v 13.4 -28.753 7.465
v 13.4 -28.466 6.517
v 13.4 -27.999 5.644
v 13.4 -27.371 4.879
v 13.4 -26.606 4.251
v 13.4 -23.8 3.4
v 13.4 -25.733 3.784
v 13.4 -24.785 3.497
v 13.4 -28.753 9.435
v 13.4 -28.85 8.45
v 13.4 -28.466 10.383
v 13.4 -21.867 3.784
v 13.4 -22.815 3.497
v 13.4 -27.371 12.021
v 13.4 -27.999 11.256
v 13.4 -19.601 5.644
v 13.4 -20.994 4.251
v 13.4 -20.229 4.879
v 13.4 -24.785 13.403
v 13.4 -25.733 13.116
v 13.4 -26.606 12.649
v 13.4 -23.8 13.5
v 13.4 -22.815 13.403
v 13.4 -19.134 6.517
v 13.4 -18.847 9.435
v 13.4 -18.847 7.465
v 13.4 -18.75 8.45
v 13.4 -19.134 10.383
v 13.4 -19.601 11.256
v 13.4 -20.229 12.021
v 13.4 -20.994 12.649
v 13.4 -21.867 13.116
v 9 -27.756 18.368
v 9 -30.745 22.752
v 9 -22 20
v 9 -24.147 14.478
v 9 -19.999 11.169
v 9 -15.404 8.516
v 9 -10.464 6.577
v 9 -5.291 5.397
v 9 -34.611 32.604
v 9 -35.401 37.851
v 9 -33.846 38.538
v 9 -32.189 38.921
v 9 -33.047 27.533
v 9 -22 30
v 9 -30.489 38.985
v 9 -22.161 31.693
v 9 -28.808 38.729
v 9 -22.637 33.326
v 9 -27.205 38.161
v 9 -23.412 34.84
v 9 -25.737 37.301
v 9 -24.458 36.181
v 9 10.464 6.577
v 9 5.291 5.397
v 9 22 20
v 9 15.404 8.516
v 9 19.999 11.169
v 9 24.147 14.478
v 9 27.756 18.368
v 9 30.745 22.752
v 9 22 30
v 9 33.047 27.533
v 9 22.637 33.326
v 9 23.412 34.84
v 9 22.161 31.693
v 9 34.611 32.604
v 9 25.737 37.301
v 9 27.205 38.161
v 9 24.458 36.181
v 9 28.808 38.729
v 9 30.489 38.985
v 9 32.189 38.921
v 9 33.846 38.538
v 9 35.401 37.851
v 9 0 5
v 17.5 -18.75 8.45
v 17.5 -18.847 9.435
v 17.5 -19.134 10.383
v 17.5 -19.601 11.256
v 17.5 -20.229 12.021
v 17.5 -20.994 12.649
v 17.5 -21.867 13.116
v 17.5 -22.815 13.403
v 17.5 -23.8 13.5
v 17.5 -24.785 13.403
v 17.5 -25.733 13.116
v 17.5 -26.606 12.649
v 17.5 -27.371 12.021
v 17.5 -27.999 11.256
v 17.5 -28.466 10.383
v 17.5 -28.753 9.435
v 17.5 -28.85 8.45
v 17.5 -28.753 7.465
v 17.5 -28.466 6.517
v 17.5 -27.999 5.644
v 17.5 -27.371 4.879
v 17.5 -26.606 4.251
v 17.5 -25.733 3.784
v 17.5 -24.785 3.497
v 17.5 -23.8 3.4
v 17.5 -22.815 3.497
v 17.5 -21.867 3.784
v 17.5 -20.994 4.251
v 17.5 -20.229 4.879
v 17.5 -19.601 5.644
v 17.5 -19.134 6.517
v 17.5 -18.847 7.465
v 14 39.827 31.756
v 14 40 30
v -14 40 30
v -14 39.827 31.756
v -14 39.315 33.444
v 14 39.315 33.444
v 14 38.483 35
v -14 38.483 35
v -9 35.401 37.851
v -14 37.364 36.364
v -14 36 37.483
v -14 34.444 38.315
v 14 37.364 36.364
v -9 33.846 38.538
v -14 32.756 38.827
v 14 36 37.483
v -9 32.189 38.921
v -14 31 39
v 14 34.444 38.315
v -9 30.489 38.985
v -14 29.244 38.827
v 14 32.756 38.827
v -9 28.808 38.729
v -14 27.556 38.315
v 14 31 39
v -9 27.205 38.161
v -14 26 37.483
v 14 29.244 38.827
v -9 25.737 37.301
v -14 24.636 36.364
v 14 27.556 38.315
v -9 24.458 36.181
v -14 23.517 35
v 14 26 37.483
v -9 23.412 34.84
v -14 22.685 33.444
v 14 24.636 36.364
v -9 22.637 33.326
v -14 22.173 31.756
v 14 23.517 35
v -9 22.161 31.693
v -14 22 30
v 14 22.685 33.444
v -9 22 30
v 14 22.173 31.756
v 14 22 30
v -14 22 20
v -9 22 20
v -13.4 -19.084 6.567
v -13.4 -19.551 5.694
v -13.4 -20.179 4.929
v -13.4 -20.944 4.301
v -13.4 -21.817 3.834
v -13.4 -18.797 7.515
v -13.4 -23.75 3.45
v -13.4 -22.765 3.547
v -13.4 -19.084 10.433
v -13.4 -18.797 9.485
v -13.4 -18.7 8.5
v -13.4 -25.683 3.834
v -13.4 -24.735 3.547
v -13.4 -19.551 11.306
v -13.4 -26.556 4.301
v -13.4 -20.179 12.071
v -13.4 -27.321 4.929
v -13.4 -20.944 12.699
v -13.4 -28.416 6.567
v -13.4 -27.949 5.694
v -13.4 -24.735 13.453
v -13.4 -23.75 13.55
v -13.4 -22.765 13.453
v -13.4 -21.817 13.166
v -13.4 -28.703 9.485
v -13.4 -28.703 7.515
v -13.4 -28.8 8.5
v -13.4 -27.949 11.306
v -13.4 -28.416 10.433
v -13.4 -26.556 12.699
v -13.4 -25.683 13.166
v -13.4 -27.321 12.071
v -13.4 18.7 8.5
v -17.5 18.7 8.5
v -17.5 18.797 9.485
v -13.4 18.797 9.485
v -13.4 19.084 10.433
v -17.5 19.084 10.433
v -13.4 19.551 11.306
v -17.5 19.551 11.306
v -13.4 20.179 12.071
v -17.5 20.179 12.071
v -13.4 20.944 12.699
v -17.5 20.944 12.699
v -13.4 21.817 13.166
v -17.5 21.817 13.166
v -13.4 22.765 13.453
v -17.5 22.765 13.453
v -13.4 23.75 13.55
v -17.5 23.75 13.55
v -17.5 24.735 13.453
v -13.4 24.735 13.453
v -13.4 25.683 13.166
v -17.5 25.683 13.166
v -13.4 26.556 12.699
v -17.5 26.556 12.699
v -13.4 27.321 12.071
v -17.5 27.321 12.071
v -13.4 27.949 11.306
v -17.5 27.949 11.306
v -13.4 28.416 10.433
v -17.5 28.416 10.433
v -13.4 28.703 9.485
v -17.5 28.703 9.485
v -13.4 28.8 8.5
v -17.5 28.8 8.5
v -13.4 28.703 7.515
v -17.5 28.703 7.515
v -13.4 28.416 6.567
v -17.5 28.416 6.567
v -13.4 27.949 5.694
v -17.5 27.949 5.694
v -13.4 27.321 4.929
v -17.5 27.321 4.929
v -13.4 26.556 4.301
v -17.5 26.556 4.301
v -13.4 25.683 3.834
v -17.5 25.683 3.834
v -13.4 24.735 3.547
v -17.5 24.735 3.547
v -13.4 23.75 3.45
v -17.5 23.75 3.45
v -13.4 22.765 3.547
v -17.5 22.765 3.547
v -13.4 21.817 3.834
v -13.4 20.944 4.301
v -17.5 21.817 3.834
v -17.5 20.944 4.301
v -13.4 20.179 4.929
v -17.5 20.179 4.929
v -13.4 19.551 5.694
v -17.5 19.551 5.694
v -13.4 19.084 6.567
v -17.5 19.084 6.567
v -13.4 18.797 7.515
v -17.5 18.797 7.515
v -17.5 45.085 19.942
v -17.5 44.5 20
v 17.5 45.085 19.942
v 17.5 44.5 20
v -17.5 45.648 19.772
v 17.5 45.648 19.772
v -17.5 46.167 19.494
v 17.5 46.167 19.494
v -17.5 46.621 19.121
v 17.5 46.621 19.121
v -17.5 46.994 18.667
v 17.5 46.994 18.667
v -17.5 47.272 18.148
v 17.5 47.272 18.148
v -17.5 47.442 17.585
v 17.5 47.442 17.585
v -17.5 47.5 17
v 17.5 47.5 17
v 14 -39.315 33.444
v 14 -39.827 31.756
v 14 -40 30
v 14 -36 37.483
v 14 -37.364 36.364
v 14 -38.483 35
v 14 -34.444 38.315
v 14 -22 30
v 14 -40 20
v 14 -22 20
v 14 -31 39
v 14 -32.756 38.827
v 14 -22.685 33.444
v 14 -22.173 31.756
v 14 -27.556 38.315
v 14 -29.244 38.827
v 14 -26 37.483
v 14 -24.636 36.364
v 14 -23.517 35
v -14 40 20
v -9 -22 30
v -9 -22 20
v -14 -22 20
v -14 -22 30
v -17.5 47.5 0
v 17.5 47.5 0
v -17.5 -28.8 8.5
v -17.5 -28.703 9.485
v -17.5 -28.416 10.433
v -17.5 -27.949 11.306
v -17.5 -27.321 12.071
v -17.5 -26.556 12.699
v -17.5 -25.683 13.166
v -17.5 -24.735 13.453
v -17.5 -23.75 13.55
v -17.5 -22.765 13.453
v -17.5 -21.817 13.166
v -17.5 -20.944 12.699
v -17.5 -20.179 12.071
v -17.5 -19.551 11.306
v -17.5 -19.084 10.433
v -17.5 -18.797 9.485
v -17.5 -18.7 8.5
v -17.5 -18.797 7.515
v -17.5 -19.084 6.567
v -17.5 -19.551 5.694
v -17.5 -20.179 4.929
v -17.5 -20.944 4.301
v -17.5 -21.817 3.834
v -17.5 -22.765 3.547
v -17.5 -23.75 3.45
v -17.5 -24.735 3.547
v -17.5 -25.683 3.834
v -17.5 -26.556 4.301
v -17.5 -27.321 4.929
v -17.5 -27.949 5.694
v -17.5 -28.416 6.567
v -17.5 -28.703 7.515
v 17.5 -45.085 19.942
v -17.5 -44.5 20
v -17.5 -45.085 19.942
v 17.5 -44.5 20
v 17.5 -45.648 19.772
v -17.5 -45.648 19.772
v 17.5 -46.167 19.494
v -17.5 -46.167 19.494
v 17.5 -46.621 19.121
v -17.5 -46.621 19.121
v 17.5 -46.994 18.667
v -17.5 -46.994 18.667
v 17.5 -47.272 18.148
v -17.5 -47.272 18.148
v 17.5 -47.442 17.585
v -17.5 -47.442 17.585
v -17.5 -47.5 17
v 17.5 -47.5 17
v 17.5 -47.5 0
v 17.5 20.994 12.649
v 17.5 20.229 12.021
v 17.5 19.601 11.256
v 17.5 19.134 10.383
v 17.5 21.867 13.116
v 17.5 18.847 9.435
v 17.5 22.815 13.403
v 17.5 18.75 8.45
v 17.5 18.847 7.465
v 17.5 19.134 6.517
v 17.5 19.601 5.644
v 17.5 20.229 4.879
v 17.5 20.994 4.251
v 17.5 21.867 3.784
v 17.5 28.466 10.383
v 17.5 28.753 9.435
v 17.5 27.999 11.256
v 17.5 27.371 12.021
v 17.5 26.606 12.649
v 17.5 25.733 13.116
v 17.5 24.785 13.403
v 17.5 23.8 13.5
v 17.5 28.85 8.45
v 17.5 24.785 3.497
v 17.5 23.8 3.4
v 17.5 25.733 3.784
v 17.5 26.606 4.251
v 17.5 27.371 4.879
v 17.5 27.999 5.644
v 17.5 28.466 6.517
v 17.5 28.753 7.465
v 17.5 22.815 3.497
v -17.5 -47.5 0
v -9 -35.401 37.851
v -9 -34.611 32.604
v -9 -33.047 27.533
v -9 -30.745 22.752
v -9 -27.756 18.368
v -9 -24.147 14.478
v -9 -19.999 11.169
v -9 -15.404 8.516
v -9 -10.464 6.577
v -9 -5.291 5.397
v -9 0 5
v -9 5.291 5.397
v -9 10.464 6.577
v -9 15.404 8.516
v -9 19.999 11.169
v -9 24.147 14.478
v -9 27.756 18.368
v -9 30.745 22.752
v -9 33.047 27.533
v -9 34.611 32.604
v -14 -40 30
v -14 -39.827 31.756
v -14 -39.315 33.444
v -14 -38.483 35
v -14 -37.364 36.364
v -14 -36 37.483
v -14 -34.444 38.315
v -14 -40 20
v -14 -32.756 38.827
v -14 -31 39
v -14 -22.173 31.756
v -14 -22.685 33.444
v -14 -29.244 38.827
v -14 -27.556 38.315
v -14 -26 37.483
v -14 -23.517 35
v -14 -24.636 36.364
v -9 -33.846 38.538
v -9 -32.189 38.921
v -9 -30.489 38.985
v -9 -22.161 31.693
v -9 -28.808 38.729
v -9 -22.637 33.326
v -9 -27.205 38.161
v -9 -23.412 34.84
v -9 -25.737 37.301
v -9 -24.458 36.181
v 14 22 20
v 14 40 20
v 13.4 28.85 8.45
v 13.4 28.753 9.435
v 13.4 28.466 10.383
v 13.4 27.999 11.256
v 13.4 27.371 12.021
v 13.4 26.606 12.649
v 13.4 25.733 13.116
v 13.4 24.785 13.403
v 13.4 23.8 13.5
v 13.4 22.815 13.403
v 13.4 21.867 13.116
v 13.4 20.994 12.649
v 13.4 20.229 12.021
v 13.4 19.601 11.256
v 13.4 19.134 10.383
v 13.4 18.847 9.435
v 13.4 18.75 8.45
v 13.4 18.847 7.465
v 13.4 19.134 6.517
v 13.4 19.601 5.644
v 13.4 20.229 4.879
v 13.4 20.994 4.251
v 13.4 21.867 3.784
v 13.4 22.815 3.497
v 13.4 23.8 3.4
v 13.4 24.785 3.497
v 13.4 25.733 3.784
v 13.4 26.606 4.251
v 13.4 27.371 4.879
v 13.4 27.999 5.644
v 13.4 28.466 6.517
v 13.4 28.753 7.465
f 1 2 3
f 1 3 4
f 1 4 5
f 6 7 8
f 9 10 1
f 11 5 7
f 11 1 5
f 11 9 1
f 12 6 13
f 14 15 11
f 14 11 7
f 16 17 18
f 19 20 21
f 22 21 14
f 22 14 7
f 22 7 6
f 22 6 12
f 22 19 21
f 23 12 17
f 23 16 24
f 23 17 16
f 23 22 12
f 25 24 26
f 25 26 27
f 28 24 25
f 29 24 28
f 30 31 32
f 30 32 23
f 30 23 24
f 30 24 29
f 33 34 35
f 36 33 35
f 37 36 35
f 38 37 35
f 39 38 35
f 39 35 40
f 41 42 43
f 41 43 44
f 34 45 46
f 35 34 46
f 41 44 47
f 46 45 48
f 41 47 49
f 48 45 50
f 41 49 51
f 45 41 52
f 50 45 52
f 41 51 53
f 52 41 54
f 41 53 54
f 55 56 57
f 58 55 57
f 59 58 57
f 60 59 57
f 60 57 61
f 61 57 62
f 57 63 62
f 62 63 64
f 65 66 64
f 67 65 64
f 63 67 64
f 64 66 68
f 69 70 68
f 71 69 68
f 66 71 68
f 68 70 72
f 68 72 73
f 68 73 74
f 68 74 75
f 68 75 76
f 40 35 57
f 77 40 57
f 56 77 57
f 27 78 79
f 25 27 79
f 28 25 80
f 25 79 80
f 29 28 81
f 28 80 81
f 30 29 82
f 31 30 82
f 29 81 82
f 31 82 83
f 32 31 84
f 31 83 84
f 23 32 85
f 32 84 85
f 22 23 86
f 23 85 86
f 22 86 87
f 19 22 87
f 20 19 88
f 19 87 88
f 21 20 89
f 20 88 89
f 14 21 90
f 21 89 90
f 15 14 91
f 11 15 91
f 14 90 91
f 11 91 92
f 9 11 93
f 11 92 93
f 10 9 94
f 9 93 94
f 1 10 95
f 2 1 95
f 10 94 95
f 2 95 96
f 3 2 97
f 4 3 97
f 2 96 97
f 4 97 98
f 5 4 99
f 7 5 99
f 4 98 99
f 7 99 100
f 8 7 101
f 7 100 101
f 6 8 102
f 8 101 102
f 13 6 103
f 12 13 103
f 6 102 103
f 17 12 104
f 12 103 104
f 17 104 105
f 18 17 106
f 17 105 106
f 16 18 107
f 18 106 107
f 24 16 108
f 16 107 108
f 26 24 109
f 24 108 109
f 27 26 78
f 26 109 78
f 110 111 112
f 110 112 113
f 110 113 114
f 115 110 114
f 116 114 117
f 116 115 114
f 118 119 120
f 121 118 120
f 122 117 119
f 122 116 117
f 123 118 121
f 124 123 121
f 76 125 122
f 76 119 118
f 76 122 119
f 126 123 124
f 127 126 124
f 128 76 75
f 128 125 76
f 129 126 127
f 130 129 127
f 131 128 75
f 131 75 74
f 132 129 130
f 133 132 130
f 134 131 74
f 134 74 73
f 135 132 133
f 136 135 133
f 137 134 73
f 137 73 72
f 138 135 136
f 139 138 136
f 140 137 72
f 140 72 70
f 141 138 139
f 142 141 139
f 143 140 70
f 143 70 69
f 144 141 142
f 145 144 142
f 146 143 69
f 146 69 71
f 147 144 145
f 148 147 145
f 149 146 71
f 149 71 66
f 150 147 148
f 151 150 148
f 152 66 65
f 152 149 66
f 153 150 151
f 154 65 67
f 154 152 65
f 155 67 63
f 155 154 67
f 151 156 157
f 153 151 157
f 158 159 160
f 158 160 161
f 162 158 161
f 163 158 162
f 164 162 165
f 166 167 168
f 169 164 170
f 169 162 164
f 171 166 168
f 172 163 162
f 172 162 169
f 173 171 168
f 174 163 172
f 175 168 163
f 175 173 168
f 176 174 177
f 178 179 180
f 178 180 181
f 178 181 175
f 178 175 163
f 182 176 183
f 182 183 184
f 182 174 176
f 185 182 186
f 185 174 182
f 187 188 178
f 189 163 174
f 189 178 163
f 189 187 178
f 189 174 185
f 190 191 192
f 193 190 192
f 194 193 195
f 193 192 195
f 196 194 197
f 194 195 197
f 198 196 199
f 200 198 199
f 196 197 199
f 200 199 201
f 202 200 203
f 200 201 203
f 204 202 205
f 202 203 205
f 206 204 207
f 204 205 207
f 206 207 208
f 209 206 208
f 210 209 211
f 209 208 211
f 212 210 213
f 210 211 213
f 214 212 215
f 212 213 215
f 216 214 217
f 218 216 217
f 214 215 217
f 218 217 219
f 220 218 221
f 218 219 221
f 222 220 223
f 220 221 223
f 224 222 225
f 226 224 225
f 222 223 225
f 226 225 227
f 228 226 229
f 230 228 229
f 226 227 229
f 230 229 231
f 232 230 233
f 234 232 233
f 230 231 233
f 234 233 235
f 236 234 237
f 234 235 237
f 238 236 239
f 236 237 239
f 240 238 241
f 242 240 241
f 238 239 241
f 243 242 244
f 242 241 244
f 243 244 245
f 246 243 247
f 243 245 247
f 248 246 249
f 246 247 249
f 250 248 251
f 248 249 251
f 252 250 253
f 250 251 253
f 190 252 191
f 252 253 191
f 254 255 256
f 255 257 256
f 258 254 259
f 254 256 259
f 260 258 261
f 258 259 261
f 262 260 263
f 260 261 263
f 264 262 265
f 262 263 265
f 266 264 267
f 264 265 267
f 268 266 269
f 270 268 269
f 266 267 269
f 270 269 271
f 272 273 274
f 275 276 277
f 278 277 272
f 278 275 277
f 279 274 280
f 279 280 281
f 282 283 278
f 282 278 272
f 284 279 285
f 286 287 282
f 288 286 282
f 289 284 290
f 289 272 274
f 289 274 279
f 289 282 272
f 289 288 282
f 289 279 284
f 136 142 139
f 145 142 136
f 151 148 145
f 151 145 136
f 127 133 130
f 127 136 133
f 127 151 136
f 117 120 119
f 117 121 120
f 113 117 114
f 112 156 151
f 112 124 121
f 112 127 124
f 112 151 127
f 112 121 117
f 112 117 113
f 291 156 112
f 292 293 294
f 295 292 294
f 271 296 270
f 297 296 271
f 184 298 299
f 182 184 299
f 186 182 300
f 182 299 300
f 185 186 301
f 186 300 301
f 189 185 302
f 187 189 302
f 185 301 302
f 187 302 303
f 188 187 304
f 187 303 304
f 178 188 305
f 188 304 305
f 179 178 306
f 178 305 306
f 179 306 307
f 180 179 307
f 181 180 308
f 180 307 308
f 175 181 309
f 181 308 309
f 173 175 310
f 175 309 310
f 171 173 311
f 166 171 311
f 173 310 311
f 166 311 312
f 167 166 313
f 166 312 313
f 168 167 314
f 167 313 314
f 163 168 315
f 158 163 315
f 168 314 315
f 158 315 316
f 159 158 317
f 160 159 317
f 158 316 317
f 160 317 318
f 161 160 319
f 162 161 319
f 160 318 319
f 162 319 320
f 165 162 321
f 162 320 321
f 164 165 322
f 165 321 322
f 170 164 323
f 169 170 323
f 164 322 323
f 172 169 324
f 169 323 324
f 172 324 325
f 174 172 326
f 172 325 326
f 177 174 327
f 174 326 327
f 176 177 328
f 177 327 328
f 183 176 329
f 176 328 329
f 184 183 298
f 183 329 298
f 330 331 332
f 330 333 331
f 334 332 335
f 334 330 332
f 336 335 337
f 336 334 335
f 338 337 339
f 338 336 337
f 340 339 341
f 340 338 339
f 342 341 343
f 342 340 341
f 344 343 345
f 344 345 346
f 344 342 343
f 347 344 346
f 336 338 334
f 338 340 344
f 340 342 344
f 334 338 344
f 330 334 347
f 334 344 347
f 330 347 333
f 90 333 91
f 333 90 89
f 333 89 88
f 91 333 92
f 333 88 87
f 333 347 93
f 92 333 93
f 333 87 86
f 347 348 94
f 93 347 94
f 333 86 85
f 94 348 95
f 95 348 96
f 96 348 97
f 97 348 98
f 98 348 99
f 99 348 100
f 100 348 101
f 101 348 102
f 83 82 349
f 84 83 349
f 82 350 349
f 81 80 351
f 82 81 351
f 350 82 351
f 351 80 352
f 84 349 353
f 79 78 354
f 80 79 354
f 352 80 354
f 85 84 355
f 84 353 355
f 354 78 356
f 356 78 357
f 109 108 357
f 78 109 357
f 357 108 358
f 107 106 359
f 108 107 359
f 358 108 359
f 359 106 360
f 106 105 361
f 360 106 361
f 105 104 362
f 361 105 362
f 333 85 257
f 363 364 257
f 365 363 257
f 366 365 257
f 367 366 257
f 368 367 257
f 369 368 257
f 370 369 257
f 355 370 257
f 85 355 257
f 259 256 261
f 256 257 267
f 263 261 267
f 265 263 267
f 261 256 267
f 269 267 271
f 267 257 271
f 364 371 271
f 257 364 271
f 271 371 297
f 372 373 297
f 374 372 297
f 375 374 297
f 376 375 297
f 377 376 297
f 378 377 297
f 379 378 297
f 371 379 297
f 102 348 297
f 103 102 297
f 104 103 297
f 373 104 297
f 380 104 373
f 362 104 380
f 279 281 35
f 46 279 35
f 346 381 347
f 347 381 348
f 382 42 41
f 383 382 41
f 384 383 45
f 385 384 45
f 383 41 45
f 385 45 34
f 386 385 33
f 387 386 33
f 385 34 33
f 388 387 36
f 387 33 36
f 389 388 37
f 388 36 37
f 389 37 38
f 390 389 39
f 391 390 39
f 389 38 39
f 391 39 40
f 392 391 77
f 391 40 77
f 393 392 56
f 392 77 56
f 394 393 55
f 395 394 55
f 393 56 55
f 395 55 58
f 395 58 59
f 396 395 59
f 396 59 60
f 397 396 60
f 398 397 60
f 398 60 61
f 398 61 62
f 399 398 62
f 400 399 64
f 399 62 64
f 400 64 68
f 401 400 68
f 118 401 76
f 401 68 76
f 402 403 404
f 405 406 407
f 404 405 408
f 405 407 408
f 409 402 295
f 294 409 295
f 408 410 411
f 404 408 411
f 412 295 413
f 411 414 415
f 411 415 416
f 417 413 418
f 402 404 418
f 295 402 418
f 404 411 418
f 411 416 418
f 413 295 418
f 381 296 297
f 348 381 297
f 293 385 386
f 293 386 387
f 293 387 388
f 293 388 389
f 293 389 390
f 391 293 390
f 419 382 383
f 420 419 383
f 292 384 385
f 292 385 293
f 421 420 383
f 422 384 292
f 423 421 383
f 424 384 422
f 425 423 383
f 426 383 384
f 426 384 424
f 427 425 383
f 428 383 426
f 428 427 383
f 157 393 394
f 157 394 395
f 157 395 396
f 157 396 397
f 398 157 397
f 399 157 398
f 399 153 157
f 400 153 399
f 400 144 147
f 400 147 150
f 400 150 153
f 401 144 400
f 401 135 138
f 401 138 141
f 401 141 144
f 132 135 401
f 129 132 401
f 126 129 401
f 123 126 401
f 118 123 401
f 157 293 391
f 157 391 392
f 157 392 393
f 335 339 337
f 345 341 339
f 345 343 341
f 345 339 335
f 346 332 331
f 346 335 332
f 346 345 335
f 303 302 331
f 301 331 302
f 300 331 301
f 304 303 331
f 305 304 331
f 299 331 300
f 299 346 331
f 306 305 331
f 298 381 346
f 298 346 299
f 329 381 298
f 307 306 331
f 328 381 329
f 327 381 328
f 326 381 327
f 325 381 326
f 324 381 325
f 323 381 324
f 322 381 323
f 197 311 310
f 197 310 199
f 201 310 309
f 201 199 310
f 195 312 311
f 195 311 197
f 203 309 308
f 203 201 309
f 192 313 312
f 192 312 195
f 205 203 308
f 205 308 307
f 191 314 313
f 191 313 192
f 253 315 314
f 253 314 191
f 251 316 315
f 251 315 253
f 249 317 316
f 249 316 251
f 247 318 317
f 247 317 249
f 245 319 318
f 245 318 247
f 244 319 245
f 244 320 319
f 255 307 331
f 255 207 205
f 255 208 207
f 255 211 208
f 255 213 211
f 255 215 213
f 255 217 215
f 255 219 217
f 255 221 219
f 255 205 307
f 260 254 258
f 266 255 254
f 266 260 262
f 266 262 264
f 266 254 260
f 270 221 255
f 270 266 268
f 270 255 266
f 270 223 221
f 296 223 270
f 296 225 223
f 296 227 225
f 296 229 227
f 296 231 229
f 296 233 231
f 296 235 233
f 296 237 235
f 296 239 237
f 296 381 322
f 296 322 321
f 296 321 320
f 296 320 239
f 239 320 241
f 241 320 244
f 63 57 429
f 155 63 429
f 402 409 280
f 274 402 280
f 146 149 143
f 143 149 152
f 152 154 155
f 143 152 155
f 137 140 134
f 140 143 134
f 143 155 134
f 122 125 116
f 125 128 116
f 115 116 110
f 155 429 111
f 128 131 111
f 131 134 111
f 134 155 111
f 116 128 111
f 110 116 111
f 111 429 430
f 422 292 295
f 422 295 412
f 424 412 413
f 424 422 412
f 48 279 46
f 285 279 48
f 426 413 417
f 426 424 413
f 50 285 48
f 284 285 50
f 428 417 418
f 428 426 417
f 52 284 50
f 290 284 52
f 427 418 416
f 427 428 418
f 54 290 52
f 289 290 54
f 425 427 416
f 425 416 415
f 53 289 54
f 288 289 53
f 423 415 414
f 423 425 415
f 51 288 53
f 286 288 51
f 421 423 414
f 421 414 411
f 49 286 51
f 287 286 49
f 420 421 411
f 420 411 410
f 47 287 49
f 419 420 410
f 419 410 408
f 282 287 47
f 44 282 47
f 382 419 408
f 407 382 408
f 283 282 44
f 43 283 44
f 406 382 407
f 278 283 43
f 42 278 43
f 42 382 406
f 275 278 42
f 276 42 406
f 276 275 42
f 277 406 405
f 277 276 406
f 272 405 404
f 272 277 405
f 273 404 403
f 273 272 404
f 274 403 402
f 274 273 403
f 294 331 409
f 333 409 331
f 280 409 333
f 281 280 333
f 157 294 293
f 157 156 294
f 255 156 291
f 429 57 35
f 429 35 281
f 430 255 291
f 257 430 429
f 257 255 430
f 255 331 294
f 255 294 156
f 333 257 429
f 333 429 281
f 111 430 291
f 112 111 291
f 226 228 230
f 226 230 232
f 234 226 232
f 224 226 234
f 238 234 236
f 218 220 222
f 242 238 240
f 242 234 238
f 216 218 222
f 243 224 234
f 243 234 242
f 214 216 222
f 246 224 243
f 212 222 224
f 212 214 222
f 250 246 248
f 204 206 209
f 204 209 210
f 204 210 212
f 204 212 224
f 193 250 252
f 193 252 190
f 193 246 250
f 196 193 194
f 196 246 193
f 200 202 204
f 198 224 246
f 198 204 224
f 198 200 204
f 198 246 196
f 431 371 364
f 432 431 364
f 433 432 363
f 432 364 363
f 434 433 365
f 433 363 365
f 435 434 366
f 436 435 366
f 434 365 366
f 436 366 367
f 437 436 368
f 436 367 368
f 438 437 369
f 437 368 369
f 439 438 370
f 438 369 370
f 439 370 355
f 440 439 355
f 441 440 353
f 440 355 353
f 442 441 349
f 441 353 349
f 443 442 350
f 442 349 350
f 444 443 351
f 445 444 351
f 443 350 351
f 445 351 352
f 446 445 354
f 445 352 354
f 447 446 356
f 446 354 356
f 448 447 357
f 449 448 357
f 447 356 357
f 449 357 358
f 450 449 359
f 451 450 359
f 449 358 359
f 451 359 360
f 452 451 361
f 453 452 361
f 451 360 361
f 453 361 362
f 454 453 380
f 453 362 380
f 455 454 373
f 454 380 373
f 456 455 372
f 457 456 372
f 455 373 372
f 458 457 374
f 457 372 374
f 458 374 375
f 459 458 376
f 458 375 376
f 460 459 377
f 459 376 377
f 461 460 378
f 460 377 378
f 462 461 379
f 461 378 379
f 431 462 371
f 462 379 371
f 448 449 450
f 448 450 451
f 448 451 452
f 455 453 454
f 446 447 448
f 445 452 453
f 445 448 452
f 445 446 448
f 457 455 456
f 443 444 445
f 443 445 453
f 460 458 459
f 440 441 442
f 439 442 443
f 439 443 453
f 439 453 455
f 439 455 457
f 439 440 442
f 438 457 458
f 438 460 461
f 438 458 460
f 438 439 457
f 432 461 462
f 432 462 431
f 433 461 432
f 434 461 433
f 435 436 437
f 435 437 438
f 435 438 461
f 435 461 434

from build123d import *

# Parameters (mm, degrees)
F0_W      = 35
F0_H      = 95
F1_DEPTH  = 20
F2_W      = 5
F2_H      = 18
F2_W_2    = 18
F3_DEPTH  = 10
F6_DEPTH  = 28
F8_DEPTH  = 9
F9_R      = 3
F10_R     = 5.05
F11_DEPTH = 4.1
F12_R     = 5.05
F13_DEPTH = 4.1


with BuildPart() as f1:
    # F0 (on Top) → F1 (new body)
    with BuildSketch(Plane.XY):
        Rectangle(F0_W, F0_H)
    extrude(amount=F1_DEPTH)

    # F2 (on face) → F3 (join)
    with BuildSketch(Plane.XY.offset(20)):
        with Locations((-11.5, -31)):
            Rectangle(F2_W, F2_H)
        with Locations((11.5, -31)):
            Rectangle(F2_W, F2_H)
        with Locations((11.5, 31)):
            Rectangle(F2_W, F2_H)
        with Locations((-11.5, 31)):
            Rectangle(F2_W, F2_H)
        with Locations((0, -31)):
            Rectangle(F2_W_2, F2_H)
        with Locations((0, 31)):
            Rectangle(F2_W_2, F2_H)
    extrude(amount=F3_DEPTH)

    # F5 (on face) + F4 (on face) → F6 (join)
    with BuildSketch(Plane.YZ.offset(14)):
        with BuildLine():
            Line((-40, 30), (-22, 30))
            ThreePointArc((-22, 30), (-31, 39), (-40, 30))
        make_face()
    with BuildSketch(Plane.YZ.offset(14)):
        with BuildLine():
            Line((22, 30), (40, 30))
            ThreePointArc((40, 30), (31, 39), (22, 30))
        make_face()
    extrude(amount=-F6_DEPTH)

    # F7 (on Right) → F8 (cut, symmetric)
    with BuildSketch(Plane.YZ):
        with BuildLine():
            ThreePointArc((7.6e-09, 76), (-25.1022907294, 65.6022907348), (-35.5, 40.5))
            Line((-35.5, 40.5), (35.5, 40.5))
            ThreePointArc((35.5, 40.5), (25.1022907348, 65.6022907294), (7.6e-09, 76))
        make_face()
        with BuildLine():
            Line((-35.5, 76), (-35.5, 40.5))
            ThreePointArc((-35.5, 40.5), (-25.1022907294, 65.6022907348), (7.6e-09, 76))
            Line((7.6e-09, 76), (-35.5, 76))
        make_face()
        with BuildLine():
            ThreePointArc((7.6e-09, 76), (25.1022907348, 65.6022907294), (35.5, 40.5))
            Line((35.5, 40.5), (35.5, 76))
            Line((35.5, 76), (7.6e-09, 76))
        make_face()
        with BuildLine():
            Line((35.5, 40.5), (-35.5, 40.5))
            ThreePointArc((-35.5, 40.5), (0, 5), (35.5, 40.5))
        make_face()
    extrude(amount=F8_DEPTH, both=True, mode=Mode.SUBTRACT)

    # F9
    f9_edges = [f1.edges().sort_by_distance(p)[0] for p in [
        (0, -47.5, 20),
        (0, 47.5, 20),
    ]]
    fillet(f9_edges, radius=F9_R)

    # F10 (on face) → F11 (cut)
    with BuildSketch(Plane.YZ.offset(17.5)):
        with Locations((-23.8, 8.45)):
            Circle(F10_R)
        with Locations((23.8, 8.45)):
            Circle(F10_R)
    extrude(amount=-F11_DEPTH, mode=Mode.SUBTRACT)

    # F12 (on face) → F13 (cut)
    with BuildSketch(Plane(origin=(-17.5, 0, 0), x_dir=(0, -1, 0), z_dir=(-1, 0, 0))):
        with Locations((-23.75, 8.5)):
            Circle(F12_R)
        with Locations((23.75, 8.5)):
            Circle(F12_R)
    extrude(amount=-F13_DEPTH, mode=Mode.SUBTRACT)


solid = f1.part
